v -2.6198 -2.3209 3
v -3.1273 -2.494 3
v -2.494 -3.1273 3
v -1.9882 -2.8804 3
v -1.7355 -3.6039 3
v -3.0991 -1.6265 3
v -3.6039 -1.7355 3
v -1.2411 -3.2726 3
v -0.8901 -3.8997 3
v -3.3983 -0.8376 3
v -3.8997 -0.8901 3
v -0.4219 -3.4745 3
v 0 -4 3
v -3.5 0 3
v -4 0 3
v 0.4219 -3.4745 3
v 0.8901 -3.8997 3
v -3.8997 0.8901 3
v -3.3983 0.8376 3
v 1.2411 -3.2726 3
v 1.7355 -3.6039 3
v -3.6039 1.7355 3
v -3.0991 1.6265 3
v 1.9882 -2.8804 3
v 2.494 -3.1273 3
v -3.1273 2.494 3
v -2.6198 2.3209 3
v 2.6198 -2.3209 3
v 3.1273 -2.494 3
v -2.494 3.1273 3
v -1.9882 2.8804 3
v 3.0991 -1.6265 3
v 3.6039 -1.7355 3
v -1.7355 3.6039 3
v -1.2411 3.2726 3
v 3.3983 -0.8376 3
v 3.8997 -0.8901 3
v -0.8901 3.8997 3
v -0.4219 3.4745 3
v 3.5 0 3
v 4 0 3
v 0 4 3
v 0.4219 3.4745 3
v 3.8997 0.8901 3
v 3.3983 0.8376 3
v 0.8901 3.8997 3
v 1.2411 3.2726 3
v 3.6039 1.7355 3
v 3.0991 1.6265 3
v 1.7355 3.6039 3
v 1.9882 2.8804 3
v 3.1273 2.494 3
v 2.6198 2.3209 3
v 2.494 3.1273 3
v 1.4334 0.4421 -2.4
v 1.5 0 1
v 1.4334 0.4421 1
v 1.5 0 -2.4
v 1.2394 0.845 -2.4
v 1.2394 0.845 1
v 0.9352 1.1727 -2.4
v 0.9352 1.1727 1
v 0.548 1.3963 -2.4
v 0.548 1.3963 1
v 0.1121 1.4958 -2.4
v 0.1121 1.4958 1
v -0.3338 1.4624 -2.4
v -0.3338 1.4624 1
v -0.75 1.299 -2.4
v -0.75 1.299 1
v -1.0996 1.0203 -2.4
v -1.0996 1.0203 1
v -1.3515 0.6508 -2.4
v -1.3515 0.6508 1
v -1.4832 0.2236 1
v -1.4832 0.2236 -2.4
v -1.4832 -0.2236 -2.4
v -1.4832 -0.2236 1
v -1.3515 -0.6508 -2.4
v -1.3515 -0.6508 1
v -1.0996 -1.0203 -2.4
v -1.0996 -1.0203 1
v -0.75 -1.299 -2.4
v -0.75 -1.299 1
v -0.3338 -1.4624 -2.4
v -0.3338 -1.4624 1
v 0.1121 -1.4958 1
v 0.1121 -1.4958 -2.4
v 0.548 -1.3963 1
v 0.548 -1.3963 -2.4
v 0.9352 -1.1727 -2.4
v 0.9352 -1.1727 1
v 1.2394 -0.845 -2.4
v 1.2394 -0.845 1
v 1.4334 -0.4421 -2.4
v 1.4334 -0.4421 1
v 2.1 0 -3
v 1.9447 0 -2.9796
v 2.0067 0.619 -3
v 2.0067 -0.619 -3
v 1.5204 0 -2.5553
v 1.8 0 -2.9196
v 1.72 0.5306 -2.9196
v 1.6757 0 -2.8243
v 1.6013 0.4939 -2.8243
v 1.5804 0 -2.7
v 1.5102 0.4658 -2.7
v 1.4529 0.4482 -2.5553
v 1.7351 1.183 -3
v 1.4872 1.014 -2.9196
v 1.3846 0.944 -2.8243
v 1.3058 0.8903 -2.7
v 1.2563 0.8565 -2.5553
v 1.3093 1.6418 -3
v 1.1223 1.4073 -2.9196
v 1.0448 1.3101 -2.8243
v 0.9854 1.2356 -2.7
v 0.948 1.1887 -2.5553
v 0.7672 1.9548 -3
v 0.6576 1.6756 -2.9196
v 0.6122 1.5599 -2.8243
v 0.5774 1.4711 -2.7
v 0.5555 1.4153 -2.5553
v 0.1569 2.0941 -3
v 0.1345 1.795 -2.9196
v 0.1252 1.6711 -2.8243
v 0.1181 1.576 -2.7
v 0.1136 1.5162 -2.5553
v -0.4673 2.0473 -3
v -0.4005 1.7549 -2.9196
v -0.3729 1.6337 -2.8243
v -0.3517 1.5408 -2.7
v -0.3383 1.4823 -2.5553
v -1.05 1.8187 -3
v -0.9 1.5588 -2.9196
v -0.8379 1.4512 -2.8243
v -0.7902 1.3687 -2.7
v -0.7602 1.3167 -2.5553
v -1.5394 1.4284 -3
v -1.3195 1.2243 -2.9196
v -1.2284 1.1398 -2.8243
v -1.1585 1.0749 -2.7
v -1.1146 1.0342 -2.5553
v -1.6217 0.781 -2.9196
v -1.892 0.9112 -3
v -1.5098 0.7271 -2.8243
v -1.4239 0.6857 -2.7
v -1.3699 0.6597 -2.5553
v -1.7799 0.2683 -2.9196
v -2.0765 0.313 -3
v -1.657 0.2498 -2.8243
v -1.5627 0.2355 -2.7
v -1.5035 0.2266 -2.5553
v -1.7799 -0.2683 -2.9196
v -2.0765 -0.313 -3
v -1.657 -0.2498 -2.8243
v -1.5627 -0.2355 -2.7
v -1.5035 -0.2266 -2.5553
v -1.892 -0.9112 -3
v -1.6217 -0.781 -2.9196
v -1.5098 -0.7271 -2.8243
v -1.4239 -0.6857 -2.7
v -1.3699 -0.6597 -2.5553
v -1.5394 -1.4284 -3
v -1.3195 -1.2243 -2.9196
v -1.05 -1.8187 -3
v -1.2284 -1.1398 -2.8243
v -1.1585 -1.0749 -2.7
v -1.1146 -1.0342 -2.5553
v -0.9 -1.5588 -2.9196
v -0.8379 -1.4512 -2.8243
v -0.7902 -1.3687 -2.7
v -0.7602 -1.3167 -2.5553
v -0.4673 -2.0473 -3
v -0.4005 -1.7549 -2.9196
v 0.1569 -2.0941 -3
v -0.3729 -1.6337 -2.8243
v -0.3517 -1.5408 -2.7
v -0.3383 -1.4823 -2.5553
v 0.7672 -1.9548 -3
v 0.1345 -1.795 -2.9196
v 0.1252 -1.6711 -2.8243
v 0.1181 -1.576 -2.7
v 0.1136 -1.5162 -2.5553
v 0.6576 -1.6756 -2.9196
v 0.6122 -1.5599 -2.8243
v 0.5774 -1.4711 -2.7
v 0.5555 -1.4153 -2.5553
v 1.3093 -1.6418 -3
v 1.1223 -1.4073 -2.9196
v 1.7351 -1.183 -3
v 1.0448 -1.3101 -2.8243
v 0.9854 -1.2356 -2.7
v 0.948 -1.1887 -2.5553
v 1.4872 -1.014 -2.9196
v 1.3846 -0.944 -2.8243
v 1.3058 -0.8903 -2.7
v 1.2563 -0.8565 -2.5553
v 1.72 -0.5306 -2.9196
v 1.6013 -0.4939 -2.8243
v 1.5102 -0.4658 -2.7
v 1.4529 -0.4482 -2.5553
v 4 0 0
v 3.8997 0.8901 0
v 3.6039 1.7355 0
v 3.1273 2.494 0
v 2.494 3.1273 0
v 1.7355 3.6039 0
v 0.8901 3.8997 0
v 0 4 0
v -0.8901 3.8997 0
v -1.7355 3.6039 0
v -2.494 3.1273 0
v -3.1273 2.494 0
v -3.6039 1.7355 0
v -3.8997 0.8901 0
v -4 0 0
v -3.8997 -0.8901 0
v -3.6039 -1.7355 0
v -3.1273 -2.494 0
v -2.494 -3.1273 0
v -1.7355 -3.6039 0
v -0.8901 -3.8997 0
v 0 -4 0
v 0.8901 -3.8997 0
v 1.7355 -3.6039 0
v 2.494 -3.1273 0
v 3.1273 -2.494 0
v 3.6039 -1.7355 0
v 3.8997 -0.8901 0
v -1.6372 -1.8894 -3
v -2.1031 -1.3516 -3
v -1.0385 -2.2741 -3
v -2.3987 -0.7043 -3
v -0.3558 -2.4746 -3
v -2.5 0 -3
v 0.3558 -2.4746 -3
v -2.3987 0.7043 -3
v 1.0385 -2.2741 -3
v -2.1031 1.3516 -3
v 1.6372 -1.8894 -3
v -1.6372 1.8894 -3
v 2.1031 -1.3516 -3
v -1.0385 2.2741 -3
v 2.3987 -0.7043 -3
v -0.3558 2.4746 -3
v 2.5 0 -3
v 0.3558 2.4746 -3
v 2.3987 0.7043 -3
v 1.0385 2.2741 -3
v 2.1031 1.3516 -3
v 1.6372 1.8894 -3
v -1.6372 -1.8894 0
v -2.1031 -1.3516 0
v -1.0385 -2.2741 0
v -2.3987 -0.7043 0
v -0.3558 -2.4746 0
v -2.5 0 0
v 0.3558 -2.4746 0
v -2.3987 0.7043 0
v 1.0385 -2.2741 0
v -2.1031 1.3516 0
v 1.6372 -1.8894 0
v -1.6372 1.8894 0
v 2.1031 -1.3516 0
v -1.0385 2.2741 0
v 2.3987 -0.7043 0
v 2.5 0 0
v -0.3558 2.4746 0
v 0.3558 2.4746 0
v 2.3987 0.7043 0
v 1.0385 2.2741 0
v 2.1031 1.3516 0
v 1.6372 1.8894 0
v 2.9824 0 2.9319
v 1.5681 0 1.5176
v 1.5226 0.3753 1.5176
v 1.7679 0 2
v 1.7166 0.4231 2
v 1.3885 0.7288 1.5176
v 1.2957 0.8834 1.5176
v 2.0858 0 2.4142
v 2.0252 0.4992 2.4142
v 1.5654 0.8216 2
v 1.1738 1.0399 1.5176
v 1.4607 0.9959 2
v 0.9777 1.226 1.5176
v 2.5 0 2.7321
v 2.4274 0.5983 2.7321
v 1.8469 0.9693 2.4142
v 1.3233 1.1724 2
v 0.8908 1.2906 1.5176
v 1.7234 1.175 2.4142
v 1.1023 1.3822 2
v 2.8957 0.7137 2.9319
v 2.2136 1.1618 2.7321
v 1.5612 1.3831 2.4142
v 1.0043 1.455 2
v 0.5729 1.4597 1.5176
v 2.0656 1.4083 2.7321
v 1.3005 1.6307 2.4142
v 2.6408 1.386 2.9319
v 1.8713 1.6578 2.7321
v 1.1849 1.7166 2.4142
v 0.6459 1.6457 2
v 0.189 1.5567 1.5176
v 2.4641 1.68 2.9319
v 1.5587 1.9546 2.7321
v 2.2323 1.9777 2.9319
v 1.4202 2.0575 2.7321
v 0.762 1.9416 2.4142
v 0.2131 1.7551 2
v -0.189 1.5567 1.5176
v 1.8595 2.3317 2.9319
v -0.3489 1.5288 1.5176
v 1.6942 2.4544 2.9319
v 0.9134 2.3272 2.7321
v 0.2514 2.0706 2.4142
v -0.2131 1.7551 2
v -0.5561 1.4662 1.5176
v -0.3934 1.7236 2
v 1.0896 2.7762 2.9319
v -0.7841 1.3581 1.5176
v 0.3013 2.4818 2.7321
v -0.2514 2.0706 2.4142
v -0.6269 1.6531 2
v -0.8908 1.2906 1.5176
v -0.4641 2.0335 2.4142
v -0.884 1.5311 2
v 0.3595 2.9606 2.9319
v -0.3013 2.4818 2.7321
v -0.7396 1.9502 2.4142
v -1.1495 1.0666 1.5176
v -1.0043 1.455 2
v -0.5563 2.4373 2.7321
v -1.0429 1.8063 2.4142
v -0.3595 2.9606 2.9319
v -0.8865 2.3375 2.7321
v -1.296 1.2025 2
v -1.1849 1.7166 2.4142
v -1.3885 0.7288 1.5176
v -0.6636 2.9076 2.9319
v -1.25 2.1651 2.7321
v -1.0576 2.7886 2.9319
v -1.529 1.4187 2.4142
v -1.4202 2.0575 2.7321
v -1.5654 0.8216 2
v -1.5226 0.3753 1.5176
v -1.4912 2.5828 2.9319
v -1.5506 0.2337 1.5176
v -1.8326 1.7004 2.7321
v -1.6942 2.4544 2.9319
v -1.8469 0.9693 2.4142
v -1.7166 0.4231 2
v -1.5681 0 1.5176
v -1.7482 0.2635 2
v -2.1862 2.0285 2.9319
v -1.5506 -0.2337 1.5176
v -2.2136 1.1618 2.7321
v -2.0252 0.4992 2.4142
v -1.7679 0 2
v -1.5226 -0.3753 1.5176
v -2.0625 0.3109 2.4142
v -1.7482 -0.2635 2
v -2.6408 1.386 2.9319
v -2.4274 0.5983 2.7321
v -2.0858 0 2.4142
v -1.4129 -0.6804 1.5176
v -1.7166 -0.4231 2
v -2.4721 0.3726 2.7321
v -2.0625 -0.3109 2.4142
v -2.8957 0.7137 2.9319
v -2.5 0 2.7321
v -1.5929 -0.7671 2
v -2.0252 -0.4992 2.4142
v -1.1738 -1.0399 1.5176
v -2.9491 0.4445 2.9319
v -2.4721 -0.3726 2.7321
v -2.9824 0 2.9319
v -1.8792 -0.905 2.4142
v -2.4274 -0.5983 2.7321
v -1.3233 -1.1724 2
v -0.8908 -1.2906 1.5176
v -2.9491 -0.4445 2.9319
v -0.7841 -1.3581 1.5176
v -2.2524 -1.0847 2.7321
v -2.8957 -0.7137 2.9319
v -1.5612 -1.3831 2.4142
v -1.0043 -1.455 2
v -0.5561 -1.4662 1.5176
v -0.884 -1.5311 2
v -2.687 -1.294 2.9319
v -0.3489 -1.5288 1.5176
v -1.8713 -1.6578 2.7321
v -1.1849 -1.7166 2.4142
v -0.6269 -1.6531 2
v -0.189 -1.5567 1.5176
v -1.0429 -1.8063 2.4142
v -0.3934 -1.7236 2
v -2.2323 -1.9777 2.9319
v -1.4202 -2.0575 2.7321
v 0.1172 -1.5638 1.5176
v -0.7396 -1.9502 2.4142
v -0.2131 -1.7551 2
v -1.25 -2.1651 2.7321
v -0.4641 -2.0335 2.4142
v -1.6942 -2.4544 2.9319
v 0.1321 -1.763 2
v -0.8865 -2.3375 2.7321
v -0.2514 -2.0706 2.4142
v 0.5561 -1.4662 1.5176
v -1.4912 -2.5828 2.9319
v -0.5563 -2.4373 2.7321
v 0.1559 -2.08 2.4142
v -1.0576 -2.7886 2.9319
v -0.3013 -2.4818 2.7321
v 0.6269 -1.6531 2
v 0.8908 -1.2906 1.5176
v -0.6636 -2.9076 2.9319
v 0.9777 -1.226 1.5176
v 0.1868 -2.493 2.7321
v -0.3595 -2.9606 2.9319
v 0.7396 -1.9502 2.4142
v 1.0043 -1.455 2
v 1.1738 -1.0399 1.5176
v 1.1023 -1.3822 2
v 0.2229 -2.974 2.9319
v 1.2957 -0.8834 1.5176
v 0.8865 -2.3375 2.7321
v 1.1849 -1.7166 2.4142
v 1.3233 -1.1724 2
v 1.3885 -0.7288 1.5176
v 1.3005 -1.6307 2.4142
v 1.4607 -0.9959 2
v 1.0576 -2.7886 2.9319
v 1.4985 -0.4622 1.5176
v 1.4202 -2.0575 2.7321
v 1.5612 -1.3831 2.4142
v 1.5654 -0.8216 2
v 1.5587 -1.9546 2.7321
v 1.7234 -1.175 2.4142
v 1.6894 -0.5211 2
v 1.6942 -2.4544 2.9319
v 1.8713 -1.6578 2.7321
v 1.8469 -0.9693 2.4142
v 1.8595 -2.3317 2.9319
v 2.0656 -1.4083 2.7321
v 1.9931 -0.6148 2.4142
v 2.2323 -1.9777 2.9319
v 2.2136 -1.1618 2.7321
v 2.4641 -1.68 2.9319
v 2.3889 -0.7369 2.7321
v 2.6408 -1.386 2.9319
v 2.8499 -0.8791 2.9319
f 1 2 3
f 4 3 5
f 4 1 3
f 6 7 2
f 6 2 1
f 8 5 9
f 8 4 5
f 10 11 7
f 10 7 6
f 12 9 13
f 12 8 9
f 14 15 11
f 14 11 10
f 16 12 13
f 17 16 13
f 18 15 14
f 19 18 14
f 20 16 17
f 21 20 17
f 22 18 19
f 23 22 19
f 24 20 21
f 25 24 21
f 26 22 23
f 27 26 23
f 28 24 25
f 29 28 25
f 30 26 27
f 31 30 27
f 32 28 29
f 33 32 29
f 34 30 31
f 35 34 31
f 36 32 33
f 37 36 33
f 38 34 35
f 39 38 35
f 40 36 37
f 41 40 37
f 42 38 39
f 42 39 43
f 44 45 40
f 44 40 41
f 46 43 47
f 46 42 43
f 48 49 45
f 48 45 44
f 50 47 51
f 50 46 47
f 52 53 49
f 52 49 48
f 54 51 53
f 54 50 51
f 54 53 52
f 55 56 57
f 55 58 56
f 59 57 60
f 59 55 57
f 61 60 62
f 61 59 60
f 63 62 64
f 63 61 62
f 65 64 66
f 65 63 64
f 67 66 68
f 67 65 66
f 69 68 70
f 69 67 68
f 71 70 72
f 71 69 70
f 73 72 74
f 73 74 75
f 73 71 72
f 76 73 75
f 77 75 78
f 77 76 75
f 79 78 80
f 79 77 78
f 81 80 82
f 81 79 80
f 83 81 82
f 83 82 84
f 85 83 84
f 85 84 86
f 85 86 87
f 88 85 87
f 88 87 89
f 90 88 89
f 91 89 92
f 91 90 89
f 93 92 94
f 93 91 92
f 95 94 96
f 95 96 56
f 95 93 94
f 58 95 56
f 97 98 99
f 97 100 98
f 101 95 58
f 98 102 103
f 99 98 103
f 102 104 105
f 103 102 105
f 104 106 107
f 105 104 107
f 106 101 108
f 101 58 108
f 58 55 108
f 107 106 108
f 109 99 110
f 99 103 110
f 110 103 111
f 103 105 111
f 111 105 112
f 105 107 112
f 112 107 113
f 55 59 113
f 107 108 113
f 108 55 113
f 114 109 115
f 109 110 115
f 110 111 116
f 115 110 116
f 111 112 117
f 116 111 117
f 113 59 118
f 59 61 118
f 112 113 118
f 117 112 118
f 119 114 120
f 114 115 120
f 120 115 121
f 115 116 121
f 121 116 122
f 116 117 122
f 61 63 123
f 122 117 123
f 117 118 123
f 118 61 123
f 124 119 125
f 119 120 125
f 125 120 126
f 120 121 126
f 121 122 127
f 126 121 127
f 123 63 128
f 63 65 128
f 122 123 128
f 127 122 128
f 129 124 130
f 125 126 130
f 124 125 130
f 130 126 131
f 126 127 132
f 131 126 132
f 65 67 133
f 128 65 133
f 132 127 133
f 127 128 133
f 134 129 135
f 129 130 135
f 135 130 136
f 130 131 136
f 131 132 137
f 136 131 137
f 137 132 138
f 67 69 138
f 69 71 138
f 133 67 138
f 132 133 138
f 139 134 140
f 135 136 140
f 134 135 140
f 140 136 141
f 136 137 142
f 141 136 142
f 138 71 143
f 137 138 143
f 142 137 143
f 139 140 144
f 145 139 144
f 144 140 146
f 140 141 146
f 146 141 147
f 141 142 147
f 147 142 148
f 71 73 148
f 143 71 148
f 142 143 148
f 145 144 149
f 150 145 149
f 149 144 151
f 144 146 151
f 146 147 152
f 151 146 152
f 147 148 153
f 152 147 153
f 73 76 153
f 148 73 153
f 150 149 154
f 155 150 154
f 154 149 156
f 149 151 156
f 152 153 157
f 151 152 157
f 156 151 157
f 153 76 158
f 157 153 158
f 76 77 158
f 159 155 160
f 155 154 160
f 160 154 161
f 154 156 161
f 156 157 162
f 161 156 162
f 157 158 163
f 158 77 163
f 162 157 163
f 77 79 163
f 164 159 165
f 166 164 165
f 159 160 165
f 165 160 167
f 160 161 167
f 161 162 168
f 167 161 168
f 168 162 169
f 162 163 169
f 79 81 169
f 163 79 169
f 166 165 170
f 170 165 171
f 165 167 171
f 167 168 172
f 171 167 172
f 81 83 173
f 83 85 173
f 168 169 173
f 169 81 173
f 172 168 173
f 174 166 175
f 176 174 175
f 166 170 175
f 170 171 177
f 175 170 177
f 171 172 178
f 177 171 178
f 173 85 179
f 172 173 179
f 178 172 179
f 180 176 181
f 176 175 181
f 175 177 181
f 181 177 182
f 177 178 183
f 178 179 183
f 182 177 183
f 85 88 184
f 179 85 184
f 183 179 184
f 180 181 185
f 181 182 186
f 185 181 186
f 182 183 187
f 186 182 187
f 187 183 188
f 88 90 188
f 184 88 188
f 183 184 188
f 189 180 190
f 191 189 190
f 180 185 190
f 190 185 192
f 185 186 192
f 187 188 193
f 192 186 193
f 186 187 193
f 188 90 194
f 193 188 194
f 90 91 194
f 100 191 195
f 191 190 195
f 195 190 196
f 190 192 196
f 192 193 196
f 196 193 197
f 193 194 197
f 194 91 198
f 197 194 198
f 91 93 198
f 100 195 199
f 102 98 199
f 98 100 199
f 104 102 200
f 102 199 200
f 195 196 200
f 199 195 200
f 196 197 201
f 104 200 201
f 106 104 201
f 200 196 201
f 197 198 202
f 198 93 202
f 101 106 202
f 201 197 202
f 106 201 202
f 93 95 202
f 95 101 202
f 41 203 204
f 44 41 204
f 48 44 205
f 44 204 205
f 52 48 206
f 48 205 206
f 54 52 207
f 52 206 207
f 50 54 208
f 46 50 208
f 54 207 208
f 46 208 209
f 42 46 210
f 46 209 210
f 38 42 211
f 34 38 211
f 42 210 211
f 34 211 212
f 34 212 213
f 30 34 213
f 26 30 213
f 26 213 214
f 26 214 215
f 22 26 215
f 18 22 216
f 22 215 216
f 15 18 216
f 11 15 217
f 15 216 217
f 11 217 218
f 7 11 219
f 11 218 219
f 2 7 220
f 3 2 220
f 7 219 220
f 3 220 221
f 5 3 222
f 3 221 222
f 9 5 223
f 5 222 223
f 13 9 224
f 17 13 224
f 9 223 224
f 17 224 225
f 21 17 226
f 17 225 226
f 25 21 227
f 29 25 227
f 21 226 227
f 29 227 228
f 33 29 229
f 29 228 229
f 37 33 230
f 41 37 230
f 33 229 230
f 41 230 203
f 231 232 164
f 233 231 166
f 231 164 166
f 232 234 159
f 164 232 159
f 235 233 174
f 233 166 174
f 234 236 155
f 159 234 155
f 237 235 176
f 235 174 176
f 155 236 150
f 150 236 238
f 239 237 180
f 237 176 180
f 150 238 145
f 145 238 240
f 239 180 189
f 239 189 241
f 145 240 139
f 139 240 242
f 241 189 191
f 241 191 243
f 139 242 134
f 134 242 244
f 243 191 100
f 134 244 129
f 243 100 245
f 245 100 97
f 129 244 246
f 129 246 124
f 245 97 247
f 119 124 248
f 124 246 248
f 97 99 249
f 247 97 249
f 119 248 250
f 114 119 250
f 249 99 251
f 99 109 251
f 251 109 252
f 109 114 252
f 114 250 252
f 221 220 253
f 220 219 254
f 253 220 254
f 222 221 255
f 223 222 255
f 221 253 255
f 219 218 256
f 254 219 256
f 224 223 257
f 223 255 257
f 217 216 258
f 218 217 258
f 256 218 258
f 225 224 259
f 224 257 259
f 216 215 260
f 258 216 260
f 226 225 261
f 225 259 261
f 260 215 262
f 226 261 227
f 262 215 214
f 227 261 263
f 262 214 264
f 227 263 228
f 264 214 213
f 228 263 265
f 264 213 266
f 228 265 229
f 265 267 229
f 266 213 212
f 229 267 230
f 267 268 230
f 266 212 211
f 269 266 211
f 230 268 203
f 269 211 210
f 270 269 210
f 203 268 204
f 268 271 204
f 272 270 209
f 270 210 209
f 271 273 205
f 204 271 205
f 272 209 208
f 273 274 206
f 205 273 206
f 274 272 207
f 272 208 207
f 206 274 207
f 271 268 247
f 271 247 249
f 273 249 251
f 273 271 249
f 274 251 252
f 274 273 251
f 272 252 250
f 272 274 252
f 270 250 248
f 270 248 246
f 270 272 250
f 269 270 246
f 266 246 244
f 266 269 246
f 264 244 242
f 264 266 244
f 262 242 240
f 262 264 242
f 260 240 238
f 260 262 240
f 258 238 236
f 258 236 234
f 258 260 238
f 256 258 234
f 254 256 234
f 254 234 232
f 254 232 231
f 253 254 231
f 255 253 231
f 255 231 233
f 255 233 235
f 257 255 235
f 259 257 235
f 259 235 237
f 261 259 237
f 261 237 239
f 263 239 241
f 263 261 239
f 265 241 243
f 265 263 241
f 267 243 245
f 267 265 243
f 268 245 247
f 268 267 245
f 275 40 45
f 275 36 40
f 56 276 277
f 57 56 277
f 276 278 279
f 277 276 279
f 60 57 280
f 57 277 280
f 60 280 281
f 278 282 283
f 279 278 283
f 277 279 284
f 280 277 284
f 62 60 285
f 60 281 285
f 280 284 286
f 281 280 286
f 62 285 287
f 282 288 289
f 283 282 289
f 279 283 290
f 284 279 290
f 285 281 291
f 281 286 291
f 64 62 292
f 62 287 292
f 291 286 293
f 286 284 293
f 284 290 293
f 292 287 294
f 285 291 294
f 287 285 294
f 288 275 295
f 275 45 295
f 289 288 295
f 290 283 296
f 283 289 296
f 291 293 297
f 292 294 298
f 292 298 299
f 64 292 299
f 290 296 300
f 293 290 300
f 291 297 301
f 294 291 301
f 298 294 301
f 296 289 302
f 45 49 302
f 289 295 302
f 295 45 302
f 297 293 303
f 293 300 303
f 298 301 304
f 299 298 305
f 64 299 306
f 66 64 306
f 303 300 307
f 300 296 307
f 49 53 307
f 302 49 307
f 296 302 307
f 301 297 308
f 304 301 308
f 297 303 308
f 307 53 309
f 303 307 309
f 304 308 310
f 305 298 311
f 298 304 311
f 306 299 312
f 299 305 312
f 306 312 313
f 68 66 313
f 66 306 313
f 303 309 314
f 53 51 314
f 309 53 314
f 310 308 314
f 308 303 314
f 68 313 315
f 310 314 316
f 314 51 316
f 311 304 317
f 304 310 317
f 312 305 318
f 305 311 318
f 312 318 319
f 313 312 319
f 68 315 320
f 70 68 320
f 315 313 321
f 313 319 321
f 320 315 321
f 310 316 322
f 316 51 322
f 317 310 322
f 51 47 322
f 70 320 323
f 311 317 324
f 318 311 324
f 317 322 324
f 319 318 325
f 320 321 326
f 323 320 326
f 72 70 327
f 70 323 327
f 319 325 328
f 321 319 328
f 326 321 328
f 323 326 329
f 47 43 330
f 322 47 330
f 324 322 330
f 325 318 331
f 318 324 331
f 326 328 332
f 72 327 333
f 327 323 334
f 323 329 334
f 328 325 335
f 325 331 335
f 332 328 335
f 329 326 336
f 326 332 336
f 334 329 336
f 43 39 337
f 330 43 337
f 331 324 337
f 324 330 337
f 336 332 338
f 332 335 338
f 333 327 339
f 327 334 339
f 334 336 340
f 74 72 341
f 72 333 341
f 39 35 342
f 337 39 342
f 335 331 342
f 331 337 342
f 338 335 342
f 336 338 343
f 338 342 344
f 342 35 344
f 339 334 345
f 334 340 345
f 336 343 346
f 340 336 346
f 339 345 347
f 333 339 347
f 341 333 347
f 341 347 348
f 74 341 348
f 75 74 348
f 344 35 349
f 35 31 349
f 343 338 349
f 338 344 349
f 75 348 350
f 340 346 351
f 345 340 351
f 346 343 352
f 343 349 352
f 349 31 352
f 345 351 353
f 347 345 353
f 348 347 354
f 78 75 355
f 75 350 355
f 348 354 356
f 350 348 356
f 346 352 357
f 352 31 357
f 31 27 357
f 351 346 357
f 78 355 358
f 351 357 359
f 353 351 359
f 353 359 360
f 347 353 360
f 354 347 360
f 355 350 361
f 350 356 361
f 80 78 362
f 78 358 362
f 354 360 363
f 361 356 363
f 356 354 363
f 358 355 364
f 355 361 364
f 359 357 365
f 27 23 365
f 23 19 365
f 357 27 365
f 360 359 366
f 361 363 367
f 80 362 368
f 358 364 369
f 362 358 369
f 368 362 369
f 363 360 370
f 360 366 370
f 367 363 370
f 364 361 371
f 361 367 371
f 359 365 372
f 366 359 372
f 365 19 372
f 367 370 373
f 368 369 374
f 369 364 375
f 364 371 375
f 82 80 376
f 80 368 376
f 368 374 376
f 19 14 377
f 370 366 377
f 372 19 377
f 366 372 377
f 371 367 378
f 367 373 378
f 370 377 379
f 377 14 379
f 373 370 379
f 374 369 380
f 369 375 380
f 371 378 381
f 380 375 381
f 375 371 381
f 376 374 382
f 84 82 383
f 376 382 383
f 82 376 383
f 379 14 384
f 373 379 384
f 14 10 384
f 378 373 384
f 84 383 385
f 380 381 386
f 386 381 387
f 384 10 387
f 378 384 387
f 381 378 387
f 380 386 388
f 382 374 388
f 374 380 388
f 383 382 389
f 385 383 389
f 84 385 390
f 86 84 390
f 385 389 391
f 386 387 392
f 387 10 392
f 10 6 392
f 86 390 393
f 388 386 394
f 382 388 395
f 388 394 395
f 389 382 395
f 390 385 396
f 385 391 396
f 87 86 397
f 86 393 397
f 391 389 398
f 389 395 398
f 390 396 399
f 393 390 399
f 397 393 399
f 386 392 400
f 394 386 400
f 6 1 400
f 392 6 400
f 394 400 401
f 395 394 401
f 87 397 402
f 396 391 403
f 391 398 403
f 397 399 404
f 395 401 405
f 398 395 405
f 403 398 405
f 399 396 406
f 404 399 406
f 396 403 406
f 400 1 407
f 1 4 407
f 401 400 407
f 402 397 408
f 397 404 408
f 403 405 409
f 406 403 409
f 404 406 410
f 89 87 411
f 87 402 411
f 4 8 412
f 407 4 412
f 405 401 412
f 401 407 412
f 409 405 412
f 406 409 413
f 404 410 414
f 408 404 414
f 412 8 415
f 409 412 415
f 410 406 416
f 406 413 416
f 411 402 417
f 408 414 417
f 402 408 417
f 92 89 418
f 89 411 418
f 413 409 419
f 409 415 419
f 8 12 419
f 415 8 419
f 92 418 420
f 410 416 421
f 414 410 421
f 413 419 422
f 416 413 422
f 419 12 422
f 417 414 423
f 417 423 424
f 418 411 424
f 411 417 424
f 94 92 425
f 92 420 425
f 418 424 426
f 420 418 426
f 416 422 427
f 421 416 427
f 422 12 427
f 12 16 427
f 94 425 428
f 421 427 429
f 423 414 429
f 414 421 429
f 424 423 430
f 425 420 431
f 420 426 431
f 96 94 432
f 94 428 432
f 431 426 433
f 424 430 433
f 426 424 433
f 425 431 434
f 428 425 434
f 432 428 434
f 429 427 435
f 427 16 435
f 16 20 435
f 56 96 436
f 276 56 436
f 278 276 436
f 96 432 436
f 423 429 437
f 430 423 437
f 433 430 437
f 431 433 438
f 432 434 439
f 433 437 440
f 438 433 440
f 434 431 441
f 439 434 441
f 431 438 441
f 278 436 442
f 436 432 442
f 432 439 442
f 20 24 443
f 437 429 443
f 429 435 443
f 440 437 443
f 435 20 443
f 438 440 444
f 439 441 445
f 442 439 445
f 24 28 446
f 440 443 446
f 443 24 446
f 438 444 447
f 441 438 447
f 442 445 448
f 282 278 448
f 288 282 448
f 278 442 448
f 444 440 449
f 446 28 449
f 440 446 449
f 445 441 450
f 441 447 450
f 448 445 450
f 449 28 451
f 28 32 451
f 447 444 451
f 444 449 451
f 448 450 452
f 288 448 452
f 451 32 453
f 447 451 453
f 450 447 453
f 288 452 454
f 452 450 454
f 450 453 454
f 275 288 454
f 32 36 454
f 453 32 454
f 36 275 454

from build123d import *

# Parameters (mm, degrees)
F0_R     = 4
F0_R_2   = 2.5
F0_R_3   = 1.5
F1_DEPTH = 3
F2_DEPTH = 3
F3_R     = 0.6
F4_R     = 2


with BuildPart() as f1:
    # F0 (on Top) → F1 (new body)
    with BuildSketch(Plane.XY):
        Circle(F0_R)
        Circle(F0_R_2, mode=Mode.SUBTRACT)
        Circle(F0_R_2)
        Circle(F0_R_3, mode=Mode.SUBTRACT)
    extrude(amount=F1_DEPTH)

    # F0 (on Top) → F2 (join)
    with BuildSketch(Plane.XY):
        Circle(F0_R_2)
        Circle(F0_R_3, mode=Mode.SUBTRACT)
    extrude(amount=-F2_DEPTH)

    # F3
    f3_edges = [f1.edges().sort_by_distance(p)[0] for p in [
        (-1.5, 0, -3),
    ]]
    fillet(f3_edges, radius=F3_R)

    # F4
    f4_edges = [f1.edges().sort_by_distance(p)[0] for p in [
        (-1.5, 0, 3),
    ]]
    fillet(f4_edges, radius=F4_R)


solid = f1.part
